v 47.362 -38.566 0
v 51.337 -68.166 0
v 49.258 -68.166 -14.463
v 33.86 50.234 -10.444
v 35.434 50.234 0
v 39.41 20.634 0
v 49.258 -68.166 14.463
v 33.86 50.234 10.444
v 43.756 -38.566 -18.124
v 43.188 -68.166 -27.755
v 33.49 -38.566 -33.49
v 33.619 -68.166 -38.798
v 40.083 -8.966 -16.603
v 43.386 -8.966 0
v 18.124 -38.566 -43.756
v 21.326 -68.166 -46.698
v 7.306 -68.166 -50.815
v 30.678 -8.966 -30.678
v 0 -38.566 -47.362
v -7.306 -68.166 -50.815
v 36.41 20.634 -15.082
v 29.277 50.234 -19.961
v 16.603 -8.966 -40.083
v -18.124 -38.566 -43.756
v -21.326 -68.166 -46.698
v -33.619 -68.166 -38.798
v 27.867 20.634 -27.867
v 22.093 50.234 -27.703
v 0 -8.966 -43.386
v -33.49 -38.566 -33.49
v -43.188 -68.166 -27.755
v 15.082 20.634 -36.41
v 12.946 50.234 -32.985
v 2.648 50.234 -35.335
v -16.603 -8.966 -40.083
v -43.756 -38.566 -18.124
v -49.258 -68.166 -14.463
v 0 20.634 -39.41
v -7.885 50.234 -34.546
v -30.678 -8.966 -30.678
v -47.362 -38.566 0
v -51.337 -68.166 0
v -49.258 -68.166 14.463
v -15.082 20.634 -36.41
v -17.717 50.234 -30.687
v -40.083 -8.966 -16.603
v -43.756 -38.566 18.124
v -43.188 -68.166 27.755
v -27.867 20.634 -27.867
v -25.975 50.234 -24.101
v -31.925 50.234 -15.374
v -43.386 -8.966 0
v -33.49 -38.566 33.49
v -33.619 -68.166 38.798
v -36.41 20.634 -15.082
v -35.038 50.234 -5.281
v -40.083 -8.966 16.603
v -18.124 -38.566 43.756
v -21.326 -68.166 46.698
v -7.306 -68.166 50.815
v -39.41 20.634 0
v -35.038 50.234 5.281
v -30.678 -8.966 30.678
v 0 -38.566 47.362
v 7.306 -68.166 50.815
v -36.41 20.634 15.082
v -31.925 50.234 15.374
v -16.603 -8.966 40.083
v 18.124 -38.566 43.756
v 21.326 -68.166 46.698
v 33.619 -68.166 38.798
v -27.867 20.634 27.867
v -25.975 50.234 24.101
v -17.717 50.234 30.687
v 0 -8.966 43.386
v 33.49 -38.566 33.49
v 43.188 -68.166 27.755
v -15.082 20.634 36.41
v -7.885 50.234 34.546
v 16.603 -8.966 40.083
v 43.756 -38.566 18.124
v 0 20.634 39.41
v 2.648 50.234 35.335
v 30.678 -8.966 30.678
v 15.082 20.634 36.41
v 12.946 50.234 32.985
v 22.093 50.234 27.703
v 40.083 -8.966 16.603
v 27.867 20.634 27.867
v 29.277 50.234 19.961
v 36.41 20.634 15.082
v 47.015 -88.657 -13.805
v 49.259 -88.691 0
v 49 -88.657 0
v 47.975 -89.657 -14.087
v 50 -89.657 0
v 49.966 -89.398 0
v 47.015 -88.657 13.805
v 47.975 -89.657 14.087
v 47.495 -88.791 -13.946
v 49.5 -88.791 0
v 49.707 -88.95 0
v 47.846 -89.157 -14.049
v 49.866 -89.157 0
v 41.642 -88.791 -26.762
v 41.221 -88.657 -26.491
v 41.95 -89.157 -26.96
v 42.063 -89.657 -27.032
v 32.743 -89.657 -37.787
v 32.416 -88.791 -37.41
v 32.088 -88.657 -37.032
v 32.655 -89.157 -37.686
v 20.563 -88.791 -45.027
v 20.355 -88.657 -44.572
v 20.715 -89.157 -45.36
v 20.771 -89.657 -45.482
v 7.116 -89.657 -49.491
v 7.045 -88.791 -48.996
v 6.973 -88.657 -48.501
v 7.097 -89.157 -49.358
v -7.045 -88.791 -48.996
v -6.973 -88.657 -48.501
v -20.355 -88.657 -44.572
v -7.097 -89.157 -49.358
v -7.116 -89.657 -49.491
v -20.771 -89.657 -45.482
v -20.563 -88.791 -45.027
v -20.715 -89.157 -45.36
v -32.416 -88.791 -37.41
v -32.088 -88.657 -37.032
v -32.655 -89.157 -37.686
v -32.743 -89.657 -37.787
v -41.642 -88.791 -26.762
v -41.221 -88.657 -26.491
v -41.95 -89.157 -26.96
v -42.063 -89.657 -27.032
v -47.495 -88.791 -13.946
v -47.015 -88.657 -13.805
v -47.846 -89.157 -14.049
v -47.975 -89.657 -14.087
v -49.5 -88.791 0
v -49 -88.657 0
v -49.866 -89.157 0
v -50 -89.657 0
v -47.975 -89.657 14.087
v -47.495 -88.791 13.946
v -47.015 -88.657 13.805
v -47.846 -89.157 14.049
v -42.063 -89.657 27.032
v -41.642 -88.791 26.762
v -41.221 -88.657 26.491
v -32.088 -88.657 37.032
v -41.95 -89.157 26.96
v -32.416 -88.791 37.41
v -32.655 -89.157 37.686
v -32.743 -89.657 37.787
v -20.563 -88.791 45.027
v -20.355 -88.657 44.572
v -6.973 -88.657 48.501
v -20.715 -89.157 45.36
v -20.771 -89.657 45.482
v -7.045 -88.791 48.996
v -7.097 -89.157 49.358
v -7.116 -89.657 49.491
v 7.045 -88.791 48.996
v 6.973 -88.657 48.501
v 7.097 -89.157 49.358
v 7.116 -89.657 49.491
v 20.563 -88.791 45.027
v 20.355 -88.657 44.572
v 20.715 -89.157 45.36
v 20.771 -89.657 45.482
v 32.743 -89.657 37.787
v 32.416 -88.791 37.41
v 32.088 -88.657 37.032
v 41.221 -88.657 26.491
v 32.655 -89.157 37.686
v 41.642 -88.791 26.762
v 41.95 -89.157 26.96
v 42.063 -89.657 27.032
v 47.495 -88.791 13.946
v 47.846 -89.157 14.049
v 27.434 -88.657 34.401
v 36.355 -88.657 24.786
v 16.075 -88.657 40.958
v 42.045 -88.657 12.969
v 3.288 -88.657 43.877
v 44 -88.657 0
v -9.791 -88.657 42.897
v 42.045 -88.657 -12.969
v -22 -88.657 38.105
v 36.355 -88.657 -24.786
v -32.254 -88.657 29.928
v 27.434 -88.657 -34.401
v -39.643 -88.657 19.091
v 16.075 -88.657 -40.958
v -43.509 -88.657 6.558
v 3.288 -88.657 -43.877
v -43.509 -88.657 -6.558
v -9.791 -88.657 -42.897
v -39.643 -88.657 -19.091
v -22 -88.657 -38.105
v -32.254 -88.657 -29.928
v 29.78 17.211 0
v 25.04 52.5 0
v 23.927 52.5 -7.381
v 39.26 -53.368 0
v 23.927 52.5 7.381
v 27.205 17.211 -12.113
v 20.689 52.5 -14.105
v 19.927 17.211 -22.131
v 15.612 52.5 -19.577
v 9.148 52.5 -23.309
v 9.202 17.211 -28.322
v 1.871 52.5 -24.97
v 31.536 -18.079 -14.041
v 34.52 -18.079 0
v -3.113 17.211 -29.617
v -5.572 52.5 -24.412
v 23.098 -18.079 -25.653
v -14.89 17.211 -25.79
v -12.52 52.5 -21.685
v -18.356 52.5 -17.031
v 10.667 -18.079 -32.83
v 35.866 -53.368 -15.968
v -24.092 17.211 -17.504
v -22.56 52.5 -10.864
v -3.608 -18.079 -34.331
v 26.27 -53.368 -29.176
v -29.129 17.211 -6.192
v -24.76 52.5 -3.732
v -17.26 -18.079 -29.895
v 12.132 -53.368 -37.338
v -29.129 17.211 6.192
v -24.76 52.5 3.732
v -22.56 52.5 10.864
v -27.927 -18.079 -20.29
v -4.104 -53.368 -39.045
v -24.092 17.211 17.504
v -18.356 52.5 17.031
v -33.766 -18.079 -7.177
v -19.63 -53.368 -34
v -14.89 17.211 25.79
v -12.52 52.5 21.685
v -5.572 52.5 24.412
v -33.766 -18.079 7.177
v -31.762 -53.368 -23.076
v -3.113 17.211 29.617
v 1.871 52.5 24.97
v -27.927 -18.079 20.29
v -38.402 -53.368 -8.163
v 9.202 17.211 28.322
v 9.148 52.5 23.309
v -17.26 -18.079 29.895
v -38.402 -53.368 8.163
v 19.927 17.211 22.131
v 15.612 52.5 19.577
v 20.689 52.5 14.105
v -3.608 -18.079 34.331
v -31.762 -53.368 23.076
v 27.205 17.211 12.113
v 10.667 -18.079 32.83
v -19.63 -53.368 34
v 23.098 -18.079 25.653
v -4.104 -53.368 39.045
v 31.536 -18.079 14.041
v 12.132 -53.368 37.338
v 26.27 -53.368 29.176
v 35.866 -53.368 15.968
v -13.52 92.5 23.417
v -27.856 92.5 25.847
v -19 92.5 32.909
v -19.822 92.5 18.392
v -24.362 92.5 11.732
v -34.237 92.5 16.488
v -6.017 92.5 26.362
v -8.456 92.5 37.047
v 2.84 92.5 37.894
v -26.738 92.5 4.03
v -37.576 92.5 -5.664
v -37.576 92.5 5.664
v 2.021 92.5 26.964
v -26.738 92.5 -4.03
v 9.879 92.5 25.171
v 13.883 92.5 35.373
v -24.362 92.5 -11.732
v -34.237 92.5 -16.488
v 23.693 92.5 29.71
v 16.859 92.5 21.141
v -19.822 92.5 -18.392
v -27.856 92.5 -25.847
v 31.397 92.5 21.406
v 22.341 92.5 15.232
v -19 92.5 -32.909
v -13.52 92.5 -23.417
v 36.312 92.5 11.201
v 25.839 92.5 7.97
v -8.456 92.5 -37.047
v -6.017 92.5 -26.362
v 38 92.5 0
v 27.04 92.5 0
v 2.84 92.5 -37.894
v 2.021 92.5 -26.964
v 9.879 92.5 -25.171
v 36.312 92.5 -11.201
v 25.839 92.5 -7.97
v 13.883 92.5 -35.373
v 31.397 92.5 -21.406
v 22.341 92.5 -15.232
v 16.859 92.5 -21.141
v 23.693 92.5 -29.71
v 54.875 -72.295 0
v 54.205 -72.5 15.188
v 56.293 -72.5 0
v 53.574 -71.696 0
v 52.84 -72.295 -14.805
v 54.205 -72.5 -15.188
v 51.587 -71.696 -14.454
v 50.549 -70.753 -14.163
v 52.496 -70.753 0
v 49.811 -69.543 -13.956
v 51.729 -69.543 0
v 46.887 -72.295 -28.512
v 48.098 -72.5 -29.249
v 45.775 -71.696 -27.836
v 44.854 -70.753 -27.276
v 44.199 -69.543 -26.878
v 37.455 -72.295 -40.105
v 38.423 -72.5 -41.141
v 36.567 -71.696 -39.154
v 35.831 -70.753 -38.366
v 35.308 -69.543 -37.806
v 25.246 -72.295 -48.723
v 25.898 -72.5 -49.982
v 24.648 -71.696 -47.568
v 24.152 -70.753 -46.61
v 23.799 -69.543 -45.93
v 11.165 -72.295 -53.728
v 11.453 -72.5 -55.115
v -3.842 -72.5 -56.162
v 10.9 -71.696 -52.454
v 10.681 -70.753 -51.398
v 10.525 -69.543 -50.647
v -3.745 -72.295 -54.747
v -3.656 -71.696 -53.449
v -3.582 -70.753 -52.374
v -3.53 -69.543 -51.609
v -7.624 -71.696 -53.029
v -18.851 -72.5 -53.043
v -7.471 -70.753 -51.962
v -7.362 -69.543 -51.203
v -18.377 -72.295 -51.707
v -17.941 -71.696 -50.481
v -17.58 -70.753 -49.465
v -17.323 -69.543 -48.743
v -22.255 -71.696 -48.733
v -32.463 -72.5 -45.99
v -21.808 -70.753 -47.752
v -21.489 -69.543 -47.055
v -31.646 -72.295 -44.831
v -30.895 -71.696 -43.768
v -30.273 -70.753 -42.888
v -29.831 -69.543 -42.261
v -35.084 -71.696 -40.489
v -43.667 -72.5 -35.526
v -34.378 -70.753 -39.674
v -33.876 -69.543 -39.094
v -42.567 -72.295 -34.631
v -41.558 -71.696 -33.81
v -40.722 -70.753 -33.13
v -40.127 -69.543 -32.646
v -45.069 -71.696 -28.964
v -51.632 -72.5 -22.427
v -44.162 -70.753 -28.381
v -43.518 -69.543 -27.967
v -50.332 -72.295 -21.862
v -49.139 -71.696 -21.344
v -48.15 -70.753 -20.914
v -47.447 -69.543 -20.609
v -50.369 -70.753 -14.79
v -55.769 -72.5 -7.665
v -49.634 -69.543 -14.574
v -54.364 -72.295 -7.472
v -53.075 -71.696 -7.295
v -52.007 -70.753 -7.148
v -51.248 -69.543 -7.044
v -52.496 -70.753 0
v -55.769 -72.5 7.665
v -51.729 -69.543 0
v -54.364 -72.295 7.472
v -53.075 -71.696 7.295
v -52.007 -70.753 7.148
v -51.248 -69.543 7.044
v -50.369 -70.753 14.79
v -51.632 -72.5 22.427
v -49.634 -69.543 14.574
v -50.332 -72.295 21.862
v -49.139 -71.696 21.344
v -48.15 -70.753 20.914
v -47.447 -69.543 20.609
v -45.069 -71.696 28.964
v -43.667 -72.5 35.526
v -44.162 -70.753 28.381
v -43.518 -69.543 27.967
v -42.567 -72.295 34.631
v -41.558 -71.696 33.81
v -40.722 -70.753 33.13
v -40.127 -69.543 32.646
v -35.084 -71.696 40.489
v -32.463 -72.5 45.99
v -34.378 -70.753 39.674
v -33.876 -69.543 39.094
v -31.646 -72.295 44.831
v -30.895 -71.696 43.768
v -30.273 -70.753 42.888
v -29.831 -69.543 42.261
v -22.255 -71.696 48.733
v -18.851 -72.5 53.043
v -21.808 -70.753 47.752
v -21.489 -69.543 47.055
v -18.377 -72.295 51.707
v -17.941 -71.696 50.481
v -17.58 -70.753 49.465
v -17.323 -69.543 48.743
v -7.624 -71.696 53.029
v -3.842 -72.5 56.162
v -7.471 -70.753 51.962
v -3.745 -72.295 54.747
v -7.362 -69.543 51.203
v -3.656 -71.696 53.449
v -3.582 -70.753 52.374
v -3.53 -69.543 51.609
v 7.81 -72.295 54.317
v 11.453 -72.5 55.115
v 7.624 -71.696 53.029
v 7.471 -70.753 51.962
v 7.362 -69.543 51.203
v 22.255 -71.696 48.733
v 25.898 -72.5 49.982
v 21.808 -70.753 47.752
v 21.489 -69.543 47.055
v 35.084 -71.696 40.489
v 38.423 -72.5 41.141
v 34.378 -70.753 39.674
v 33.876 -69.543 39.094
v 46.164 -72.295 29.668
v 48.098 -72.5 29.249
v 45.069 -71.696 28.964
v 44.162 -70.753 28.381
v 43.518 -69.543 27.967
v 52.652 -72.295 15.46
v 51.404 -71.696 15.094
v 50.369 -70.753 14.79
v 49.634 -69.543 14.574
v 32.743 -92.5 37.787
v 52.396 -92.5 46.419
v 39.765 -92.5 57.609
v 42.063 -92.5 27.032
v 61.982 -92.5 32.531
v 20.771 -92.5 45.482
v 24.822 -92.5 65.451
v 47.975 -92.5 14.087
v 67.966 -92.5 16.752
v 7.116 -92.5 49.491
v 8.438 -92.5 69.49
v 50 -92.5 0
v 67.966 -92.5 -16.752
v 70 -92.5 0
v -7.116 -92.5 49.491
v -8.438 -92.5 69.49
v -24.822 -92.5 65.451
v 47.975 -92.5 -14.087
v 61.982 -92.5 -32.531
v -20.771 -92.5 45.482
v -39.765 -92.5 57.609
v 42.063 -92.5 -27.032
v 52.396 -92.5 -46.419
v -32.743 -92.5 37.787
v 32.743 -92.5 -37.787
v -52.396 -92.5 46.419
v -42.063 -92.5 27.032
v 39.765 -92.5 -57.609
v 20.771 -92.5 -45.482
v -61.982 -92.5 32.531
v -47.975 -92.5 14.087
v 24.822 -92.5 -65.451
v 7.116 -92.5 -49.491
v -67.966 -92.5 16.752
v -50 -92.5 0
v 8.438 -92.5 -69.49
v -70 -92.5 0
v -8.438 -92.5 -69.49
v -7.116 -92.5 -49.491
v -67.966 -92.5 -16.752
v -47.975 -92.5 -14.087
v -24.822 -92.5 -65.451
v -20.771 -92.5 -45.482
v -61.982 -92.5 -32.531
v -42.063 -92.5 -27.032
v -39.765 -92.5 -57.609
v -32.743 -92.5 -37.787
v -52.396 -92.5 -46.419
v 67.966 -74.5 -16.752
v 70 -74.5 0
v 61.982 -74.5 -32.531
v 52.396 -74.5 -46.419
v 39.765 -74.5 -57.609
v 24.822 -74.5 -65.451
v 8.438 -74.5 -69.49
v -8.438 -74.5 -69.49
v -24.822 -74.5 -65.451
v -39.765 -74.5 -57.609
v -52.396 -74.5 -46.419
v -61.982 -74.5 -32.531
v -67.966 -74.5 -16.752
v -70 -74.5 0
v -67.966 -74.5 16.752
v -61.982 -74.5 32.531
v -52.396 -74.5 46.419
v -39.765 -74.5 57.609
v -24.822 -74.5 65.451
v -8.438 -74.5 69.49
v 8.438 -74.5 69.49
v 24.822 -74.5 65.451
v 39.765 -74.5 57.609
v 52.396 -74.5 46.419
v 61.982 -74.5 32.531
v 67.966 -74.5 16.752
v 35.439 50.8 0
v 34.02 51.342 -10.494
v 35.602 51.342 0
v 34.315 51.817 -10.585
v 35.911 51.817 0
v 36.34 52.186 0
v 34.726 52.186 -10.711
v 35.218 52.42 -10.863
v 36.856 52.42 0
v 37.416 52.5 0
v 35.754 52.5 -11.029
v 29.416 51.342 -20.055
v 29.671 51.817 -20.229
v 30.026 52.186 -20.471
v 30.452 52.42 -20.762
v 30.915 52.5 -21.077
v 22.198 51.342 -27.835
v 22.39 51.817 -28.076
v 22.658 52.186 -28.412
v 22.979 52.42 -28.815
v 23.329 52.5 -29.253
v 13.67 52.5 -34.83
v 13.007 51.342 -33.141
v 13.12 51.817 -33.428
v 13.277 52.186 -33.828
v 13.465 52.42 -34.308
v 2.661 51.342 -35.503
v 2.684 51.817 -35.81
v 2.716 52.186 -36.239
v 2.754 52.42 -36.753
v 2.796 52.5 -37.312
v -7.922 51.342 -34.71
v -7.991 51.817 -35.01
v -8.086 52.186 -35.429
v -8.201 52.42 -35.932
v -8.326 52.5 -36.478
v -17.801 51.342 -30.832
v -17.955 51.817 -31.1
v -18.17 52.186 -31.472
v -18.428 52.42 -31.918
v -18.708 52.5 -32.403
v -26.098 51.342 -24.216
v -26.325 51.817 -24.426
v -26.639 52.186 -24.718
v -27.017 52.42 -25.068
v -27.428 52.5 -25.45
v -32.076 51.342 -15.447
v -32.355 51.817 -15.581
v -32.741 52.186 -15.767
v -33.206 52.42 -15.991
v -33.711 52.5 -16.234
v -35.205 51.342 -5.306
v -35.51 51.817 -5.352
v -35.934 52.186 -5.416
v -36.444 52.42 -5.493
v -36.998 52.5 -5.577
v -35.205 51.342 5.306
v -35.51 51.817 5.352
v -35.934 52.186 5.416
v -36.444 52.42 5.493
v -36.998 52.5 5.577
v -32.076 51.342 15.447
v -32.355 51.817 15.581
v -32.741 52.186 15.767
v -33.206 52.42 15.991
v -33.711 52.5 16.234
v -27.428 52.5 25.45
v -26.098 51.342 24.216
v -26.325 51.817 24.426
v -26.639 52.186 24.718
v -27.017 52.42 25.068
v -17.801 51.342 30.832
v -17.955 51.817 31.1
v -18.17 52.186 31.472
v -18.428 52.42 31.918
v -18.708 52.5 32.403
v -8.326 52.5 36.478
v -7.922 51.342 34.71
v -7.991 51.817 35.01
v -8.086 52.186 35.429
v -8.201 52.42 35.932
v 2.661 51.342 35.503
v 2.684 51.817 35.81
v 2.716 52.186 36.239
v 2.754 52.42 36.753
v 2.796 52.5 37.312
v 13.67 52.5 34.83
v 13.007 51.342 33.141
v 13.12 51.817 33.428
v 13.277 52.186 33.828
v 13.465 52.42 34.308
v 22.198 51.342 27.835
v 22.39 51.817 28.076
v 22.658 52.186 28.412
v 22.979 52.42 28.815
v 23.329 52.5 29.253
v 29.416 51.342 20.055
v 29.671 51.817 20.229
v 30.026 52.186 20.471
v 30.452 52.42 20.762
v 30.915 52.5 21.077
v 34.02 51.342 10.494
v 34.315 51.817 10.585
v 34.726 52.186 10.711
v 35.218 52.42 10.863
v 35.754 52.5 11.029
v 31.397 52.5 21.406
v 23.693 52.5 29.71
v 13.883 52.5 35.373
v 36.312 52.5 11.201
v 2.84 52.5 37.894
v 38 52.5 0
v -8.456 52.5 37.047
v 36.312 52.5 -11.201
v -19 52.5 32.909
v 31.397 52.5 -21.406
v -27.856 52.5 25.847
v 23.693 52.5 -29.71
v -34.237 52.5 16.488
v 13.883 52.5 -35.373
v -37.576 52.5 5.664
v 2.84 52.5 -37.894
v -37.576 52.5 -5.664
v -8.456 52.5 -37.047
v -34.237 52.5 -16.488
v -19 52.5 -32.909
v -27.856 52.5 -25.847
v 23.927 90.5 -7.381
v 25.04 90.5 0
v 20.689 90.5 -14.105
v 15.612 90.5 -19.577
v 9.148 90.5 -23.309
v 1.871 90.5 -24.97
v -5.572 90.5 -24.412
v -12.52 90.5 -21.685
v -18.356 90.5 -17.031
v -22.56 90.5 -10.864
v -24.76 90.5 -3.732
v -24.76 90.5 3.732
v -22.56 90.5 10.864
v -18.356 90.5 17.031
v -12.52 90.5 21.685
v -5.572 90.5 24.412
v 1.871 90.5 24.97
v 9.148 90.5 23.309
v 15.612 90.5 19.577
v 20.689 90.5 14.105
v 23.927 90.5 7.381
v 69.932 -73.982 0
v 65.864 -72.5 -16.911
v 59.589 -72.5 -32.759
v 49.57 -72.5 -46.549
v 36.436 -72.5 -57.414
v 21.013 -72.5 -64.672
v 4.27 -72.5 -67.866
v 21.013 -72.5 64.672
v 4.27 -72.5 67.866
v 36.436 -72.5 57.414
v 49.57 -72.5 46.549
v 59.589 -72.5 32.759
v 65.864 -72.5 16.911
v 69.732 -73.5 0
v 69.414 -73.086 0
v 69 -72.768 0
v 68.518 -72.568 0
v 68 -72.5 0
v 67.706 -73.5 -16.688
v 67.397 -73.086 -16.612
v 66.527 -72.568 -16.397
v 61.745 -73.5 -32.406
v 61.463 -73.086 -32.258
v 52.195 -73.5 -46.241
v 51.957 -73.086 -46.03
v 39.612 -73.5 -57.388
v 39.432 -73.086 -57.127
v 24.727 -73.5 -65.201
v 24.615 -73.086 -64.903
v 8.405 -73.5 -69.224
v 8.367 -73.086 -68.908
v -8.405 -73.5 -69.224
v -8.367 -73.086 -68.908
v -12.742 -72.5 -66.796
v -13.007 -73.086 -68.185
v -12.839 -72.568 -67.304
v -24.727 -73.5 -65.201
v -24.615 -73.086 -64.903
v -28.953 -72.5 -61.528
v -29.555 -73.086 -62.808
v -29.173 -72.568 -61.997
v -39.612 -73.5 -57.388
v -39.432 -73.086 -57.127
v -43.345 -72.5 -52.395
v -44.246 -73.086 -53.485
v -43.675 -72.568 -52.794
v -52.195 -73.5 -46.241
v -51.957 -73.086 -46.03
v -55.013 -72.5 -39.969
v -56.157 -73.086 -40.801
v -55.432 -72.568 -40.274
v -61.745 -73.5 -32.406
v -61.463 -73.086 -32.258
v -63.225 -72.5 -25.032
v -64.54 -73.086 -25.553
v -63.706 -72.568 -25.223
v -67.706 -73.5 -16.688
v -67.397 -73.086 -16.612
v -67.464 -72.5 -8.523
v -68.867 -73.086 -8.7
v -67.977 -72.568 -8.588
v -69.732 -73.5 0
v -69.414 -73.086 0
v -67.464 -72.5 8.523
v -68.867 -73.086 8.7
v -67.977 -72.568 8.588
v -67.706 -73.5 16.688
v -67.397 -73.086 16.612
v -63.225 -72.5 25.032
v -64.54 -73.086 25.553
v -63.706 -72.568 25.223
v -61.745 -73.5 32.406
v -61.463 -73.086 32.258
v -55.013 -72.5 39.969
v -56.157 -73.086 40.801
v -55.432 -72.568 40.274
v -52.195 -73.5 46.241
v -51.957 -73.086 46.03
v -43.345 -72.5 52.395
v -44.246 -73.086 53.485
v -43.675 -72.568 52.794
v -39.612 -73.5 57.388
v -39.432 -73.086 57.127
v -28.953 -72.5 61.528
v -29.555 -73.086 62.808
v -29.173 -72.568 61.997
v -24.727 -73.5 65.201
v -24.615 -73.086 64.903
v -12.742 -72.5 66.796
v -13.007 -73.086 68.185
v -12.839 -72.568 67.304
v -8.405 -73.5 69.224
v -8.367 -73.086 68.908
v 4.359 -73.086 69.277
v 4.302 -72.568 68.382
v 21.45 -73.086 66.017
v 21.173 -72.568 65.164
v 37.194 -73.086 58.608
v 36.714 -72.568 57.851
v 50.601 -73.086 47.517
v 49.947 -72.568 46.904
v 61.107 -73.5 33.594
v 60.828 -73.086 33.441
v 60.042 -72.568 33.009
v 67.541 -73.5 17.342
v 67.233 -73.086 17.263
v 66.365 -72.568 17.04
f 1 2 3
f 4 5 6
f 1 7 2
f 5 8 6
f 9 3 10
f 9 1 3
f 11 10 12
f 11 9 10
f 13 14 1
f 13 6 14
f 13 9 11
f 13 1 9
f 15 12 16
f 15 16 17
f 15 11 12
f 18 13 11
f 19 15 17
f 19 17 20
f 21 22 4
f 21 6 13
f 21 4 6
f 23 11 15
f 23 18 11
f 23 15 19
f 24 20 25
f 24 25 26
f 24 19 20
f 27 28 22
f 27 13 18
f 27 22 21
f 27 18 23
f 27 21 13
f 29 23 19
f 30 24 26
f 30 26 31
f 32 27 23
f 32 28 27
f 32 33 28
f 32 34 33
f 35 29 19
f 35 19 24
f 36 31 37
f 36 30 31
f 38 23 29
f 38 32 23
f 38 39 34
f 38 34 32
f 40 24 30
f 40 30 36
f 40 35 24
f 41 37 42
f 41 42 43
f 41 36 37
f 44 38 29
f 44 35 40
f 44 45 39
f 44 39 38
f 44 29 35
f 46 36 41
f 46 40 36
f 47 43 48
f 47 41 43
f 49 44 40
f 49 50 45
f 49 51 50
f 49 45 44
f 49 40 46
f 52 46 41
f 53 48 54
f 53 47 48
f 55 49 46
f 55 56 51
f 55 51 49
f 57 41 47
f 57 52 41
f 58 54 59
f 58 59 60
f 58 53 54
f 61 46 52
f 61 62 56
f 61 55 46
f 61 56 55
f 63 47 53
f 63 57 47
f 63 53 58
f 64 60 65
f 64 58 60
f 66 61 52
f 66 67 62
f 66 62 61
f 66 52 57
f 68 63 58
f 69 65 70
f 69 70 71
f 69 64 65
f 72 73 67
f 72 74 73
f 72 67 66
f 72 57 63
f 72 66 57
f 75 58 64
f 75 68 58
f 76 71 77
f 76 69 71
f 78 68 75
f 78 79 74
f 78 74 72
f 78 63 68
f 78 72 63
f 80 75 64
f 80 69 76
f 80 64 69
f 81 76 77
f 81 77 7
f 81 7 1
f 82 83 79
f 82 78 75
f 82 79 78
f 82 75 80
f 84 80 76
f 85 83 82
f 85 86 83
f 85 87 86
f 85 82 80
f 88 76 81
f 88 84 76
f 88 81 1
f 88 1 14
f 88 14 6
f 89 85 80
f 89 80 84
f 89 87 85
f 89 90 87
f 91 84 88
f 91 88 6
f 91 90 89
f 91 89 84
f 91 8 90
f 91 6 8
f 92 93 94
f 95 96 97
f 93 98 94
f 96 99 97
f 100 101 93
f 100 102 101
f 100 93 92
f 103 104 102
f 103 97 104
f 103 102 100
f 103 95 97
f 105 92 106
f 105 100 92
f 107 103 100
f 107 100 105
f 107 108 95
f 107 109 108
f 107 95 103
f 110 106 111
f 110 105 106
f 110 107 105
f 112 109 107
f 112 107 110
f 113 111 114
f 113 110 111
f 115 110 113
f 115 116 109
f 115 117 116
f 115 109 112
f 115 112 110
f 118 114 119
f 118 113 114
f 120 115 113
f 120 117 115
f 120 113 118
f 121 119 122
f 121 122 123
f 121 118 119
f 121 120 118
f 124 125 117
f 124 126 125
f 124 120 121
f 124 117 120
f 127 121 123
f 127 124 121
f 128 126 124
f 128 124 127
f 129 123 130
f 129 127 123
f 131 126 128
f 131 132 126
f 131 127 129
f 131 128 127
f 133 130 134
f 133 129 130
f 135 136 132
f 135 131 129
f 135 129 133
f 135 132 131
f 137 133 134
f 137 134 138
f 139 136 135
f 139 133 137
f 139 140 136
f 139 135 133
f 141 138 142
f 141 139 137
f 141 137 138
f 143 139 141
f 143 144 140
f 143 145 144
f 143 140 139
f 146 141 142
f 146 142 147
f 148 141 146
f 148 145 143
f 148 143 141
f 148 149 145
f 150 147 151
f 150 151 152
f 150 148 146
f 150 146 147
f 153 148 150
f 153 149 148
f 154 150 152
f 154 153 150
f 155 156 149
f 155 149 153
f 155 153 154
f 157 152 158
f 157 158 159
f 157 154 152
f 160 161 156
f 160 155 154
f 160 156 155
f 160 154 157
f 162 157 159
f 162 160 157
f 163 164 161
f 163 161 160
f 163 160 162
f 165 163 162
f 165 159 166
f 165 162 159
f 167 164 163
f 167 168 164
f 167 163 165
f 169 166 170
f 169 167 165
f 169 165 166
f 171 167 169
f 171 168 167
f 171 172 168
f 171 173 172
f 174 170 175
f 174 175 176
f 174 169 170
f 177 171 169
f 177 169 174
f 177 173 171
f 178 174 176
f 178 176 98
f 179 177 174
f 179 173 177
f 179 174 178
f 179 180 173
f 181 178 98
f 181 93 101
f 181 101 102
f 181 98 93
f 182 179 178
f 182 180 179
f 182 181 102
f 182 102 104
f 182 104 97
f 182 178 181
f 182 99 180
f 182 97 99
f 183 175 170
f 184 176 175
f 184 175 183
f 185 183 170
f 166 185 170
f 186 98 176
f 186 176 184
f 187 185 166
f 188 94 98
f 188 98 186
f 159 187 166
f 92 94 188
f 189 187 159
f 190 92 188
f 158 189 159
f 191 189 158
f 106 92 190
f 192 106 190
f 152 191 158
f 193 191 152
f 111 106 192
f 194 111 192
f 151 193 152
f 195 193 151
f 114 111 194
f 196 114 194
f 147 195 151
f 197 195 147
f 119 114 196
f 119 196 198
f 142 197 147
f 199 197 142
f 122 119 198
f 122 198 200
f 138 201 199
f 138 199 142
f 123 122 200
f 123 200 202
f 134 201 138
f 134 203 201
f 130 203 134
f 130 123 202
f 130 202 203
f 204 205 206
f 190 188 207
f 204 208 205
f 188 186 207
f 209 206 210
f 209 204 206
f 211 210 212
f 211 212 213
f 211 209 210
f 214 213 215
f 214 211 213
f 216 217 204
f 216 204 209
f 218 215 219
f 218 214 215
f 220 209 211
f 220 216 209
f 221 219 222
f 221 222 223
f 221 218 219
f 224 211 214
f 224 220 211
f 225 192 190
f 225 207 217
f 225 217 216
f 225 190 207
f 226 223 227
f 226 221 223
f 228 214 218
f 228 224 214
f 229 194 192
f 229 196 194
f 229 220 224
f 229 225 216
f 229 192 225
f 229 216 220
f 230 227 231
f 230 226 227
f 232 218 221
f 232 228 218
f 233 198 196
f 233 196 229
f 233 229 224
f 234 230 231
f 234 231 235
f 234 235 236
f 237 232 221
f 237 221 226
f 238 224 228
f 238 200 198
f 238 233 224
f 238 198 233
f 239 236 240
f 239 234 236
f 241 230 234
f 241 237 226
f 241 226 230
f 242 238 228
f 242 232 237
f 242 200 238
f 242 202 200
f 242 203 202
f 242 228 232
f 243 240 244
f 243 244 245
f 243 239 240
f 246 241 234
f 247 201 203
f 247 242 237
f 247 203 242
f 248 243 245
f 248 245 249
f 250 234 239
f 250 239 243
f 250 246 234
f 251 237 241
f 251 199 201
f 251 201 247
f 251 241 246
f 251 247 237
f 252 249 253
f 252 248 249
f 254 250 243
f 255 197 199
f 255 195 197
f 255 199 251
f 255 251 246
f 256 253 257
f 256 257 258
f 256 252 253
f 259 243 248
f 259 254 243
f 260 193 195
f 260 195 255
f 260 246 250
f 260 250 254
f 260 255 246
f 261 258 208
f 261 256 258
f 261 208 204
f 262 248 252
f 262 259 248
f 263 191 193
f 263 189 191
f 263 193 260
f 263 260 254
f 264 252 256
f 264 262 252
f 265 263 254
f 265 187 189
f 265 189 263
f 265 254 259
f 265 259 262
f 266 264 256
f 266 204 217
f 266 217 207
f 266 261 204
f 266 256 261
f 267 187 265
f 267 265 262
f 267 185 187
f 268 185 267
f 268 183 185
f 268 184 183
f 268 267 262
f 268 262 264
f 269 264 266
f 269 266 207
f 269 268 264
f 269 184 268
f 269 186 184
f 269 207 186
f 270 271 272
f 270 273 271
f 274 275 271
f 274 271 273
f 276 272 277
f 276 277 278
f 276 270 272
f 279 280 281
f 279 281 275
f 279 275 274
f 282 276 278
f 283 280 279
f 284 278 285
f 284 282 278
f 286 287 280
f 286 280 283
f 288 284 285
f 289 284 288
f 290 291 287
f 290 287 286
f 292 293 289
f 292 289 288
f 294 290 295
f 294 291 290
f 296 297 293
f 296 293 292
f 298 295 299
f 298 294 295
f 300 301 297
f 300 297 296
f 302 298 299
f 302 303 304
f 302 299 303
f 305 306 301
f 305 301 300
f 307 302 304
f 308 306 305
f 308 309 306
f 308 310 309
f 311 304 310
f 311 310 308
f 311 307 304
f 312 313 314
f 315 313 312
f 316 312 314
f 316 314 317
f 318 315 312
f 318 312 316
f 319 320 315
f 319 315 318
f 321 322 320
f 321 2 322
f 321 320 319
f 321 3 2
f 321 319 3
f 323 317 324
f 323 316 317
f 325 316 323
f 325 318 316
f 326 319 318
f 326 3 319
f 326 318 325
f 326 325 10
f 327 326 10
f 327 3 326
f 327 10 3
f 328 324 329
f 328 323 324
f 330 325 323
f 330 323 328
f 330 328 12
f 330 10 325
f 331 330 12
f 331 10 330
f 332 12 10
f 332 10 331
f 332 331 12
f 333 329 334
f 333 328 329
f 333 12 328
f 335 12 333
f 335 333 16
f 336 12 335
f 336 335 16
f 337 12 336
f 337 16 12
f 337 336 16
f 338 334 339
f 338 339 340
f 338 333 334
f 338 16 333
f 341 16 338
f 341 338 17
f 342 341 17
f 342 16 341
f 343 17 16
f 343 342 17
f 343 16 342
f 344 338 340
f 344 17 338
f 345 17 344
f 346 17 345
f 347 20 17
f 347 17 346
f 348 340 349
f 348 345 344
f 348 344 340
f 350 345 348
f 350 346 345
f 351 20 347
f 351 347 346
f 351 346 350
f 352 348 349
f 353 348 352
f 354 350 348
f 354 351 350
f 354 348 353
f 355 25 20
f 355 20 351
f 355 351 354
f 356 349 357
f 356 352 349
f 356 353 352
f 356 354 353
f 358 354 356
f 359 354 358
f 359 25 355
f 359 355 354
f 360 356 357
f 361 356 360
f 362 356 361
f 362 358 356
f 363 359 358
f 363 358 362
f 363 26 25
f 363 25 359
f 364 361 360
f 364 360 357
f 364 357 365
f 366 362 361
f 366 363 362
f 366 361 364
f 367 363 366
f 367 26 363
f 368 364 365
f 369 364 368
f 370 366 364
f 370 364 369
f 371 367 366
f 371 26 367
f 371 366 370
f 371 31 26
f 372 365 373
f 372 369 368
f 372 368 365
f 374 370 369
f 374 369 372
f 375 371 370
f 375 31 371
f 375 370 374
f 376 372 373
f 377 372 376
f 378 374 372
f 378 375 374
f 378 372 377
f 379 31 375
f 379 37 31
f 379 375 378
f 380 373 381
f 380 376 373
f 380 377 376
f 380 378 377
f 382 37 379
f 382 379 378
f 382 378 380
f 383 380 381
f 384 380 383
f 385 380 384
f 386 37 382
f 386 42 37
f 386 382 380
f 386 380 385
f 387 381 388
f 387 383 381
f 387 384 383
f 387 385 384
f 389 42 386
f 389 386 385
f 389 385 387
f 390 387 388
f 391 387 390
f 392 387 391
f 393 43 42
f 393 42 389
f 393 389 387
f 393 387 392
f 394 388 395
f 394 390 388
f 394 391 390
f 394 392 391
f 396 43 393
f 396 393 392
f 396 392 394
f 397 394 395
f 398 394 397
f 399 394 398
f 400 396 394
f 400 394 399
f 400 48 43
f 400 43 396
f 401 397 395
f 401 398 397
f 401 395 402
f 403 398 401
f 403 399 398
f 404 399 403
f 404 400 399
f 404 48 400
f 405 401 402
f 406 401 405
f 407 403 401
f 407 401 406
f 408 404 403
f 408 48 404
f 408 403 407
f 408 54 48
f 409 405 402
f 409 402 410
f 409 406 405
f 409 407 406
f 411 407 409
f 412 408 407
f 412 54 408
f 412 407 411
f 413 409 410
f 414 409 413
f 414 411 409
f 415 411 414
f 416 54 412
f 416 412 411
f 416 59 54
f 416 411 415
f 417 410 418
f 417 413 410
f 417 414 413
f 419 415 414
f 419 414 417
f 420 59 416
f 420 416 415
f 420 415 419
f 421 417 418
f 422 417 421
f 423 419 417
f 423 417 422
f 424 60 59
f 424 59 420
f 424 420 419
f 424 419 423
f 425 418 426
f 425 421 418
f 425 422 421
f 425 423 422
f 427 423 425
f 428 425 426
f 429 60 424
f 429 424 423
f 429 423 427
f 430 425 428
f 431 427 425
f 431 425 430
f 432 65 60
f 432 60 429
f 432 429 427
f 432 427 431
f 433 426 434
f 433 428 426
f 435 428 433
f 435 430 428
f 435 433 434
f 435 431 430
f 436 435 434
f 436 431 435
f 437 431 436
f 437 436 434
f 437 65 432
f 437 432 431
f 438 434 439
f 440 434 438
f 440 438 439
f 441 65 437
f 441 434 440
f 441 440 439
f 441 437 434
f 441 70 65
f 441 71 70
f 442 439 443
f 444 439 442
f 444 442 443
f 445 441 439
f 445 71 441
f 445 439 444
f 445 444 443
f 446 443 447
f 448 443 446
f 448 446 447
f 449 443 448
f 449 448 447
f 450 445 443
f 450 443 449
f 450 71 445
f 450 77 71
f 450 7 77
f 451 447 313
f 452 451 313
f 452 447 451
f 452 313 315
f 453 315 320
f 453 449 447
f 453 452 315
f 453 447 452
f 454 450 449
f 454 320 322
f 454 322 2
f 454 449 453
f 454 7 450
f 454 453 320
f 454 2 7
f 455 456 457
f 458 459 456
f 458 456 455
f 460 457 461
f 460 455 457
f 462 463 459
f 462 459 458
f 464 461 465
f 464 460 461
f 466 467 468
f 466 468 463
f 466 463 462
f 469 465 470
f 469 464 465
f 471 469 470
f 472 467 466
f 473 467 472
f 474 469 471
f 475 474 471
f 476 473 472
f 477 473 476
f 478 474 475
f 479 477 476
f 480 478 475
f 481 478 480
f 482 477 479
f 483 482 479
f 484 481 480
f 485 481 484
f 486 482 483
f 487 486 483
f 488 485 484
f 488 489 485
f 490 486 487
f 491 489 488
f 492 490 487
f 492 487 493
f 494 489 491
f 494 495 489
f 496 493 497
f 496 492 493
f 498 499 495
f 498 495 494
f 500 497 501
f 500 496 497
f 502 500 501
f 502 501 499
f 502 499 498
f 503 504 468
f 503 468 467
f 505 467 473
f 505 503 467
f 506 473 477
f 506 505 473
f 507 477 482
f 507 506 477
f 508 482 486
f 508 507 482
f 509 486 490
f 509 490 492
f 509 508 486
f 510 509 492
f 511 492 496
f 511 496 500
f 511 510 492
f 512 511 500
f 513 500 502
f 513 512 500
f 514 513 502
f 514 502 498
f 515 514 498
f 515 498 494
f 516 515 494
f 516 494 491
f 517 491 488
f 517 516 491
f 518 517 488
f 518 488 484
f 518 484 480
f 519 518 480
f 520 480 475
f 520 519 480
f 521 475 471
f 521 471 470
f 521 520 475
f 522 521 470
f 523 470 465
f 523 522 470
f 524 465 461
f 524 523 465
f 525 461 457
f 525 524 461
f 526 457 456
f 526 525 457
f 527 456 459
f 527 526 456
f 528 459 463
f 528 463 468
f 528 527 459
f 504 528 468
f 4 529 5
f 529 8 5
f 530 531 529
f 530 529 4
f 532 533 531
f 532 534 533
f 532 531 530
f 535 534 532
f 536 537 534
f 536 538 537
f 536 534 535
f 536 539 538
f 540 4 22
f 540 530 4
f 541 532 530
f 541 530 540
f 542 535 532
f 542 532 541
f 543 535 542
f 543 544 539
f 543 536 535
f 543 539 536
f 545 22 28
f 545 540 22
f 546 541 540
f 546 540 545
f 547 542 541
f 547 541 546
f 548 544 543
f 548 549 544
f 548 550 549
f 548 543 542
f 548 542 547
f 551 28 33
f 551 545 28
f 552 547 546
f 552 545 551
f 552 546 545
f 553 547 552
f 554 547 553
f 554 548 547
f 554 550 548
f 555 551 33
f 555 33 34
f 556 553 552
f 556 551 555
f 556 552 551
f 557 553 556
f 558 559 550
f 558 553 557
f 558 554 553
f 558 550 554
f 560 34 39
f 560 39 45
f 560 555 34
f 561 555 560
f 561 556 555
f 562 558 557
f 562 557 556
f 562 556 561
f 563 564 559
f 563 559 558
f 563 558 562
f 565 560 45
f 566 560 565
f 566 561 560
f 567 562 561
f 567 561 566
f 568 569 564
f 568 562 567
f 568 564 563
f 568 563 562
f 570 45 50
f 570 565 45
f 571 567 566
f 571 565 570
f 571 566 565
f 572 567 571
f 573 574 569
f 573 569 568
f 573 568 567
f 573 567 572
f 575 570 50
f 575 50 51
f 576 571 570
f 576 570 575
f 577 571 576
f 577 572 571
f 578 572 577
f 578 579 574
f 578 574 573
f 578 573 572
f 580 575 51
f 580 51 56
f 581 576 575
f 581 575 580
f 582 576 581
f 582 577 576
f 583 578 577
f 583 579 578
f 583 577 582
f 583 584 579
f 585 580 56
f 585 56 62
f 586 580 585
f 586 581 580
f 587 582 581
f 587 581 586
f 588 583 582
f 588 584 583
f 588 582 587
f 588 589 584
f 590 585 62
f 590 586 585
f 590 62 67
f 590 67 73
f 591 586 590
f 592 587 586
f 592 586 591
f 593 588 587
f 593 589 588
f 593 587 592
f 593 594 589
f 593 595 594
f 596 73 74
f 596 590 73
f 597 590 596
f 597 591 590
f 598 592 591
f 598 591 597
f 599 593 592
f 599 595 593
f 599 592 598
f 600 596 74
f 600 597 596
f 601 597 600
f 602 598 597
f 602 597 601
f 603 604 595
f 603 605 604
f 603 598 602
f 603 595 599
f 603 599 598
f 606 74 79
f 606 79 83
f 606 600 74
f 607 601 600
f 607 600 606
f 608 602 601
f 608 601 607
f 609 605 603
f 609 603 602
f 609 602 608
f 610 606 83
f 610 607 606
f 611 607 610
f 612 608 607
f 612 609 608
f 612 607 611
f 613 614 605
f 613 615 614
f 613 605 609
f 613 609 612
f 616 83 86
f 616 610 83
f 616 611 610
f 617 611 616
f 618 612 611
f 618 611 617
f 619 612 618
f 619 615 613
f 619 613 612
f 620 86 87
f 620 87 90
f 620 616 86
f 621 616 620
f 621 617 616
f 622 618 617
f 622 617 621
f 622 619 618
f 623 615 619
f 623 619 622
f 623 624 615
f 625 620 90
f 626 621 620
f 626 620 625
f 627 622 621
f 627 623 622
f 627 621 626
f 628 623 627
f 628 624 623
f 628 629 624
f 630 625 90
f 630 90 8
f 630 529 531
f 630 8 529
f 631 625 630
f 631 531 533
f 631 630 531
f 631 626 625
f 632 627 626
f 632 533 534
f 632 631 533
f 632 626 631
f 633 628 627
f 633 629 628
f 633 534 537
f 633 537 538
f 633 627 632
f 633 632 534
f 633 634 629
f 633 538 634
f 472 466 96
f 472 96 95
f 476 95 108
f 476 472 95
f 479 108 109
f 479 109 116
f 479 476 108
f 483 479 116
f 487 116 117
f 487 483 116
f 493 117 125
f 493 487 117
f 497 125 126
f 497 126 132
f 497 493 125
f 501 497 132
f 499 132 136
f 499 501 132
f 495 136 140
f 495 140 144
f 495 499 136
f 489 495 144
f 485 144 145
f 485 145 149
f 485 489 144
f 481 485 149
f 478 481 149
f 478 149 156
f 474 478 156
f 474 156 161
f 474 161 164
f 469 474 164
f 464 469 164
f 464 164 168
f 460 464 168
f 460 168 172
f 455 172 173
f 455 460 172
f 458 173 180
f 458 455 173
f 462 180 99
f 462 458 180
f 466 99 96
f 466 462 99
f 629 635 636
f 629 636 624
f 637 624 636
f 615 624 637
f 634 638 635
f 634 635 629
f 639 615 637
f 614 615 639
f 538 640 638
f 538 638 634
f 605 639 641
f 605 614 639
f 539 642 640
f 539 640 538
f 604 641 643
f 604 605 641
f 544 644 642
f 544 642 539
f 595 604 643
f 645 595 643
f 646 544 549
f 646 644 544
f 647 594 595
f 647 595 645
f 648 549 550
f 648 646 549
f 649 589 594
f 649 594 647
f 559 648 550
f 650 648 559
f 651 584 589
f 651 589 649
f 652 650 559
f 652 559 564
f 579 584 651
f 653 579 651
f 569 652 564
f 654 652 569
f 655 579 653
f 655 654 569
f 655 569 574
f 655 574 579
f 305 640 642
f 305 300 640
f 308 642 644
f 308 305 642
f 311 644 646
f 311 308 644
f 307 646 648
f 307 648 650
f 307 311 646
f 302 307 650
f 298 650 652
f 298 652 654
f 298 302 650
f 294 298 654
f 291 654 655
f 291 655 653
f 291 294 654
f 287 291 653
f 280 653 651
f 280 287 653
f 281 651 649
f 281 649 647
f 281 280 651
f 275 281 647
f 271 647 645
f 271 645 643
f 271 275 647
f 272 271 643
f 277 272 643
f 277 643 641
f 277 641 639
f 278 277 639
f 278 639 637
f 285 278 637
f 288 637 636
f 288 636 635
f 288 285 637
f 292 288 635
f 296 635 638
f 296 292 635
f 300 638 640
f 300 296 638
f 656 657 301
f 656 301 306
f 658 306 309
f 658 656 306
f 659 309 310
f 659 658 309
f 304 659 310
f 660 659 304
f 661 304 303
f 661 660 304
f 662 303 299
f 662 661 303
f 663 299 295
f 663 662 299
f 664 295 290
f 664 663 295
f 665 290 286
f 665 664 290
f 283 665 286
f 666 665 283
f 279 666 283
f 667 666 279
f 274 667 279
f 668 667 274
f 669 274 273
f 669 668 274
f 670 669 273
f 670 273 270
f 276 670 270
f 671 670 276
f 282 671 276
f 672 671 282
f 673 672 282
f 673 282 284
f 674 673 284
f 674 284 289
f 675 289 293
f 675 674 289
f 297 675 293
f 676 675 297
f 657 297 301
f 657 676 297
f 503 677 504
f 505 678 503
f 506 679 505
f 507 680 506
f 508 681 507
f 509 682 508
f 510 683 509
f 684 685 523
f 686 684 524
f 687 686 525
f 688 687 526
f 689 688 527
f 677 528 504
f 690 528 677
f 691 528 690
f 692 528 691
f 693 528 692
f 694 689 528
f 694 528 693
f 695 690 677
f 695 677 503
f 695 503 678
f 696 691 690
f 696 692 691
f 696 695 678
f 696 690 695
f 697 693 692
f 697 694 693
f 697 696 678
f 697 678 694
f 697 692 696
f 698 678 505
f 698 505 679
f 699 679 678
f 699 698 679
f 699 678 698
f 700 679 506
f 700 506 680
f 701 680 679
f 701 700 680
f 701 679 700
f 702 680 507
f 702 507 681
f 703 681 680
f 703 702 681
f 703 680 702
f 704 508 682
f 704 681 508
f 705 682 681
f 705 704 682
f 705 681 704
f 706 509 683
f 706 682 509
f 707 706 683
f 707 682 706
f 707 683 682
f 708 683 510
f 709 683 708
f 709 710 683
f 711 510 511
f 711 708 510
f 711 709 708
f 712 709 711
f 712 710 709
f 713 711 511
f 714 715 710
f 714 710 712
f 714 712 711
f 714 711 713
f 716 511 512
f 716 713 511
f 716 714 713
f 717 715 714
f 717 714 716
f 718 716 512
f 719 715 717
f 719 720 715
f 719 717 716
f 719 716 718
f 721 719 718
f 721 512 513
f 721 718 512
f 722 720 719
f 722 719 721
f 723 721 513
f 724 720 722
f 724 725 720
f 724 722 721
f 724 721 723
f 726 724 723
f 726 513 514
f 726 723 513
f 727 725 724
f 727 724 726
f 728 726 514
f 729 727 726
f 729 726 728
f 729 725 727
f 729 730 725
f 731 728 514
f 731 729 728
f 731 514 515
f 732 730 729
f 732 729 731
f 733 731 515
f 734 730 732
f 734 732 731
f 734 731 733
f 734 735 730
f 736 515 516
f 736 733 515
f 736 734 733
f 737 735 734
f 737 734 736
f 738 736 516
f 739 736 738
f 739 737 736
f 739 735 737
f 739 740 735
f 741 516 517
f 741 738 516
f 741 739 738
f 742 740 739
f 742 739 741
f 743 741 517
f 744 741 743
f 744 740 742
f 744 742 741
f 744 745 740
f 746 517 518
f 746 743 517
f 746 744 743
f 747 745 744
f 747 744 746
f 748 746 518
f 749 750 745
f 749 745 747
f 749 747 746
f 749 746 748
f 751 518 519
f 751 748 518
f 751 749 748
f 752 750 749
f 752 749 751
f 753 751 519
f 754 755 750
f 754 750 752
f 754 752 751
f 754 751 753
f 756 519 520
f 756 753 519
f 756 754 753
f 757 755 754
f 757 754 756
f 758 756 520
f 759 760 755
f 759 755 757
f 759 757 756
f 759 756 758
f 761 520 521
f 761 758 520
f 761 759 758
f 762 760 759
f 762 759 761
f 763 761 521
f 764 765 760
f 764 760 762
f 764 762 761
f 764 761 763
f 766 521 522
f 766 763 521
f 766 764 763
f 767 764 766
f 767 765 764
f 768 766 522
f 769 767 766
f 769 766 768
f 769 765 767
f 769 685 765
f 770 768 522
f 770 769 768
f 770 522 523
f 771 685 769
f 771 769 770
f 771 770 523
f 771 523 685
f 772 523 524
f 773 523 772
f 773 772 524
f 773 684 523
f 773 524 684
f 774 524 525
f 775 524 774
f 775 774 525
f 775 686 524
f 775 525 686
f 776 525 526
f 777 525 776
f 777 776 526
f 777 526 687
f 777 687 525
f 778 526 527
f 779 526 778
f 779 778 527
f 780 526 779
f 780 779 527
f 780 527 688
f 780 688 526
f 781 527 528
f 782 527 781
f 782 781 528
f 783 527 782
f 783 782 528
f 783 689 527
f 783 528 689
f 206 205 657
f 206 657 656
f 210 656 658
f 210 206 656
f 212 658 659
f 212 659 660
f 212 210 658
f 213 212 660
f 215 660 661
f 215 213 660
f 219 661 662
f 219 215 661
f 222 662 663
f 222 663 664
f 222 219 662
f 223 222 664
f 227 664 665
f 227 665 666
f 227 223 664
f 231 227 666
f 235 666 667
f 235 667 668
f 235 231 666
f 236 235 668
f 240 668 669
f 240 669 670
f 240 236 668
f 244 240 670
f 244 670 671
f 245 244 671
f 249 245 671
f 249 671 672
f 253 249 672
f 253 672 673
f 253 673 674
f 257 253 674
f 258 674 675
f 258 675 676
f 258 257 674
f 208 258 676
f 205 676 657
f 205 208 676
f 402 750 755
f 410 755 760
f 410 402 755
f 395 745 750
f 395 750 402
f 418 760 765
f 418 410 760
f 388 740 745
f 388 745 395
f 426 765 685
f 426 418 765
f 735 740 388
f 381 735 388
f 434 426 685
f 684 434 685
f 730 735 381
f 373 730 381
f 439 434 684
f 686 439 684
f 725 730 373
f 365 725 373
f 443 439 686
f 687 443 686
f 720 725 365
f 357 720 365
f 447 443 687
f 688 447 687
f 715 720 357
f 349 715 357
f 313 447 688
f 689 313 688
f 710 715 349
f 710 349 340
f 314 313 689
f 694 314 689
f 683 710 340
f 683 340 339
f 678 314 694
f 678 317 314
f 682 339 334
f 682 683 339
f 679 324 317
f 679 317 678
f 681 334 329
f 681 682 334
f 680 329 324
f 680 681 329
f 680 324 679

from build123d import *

# Parameters (mm, degrees)
FILLET1_R     = 5
CHAMFER1_SIZE = 2
FILLET2_R     = 1
FILLET3_R     = 2
FILLET4_R     = 2


with BuildPart() as part:
    # Sketch1 → Revolve1 (revolve)
    with BuildSketch(Plane.XY):
        Polygon((50, -88.657309004), (50, -92.5), (70, -92.5), (70, -72.5), (51.919566163, -72.5), (35.129649231, 52.5), (38, 52.5), (38, 92.5), (25.03984406, 92.5), (25.03984406, 90.5), (25.03984406, 52.5), (44, -88.657309004), align=None)
    revolve(axis=Axis((0, -92.5, 0), (0, 1, 0)))

    # Fillet1
    fillet1_edges = [part.edges().sort_by_distance(p)[0] for p in [
        (-51.919566163, -72.5, 0),
    ]]
    fillet(fillet1_edges, radius=FILLET1_R)

    # Chamfer1
    chamfer1_edges = [part.edges().sort_by_distance(p)[0] for p in [
        (-25.03984406, 92.5, 0),
    ]]
    chamfer(chamfer1_edges, length=CHAMFER1_SIZE)

    # Fillet2
    fillet2_edges = [part.edges().sort_by_distance(p)[0] for p in [
        (-50, -88.657309004, 0),
    ]]
    fillet(fillet2_edges, radius=FILLET2_R)

    # Fillet3
    fillet3_edges = [part.edges().sort_by_distance(p)[0] for p in [
        (-70, -72.5, 0),
    ]]
    fillet(fillet3_edges, radius=FILLET3_R)

    # Fillet4
    fillet4_edges = [part.edges().sort_by_distance(p)[0] for p in [
        (-35.129649231, 52.5, 0),
    ]]
    fillet(fillet4_edges, radius=FILLET4_R)


solid = part.part
